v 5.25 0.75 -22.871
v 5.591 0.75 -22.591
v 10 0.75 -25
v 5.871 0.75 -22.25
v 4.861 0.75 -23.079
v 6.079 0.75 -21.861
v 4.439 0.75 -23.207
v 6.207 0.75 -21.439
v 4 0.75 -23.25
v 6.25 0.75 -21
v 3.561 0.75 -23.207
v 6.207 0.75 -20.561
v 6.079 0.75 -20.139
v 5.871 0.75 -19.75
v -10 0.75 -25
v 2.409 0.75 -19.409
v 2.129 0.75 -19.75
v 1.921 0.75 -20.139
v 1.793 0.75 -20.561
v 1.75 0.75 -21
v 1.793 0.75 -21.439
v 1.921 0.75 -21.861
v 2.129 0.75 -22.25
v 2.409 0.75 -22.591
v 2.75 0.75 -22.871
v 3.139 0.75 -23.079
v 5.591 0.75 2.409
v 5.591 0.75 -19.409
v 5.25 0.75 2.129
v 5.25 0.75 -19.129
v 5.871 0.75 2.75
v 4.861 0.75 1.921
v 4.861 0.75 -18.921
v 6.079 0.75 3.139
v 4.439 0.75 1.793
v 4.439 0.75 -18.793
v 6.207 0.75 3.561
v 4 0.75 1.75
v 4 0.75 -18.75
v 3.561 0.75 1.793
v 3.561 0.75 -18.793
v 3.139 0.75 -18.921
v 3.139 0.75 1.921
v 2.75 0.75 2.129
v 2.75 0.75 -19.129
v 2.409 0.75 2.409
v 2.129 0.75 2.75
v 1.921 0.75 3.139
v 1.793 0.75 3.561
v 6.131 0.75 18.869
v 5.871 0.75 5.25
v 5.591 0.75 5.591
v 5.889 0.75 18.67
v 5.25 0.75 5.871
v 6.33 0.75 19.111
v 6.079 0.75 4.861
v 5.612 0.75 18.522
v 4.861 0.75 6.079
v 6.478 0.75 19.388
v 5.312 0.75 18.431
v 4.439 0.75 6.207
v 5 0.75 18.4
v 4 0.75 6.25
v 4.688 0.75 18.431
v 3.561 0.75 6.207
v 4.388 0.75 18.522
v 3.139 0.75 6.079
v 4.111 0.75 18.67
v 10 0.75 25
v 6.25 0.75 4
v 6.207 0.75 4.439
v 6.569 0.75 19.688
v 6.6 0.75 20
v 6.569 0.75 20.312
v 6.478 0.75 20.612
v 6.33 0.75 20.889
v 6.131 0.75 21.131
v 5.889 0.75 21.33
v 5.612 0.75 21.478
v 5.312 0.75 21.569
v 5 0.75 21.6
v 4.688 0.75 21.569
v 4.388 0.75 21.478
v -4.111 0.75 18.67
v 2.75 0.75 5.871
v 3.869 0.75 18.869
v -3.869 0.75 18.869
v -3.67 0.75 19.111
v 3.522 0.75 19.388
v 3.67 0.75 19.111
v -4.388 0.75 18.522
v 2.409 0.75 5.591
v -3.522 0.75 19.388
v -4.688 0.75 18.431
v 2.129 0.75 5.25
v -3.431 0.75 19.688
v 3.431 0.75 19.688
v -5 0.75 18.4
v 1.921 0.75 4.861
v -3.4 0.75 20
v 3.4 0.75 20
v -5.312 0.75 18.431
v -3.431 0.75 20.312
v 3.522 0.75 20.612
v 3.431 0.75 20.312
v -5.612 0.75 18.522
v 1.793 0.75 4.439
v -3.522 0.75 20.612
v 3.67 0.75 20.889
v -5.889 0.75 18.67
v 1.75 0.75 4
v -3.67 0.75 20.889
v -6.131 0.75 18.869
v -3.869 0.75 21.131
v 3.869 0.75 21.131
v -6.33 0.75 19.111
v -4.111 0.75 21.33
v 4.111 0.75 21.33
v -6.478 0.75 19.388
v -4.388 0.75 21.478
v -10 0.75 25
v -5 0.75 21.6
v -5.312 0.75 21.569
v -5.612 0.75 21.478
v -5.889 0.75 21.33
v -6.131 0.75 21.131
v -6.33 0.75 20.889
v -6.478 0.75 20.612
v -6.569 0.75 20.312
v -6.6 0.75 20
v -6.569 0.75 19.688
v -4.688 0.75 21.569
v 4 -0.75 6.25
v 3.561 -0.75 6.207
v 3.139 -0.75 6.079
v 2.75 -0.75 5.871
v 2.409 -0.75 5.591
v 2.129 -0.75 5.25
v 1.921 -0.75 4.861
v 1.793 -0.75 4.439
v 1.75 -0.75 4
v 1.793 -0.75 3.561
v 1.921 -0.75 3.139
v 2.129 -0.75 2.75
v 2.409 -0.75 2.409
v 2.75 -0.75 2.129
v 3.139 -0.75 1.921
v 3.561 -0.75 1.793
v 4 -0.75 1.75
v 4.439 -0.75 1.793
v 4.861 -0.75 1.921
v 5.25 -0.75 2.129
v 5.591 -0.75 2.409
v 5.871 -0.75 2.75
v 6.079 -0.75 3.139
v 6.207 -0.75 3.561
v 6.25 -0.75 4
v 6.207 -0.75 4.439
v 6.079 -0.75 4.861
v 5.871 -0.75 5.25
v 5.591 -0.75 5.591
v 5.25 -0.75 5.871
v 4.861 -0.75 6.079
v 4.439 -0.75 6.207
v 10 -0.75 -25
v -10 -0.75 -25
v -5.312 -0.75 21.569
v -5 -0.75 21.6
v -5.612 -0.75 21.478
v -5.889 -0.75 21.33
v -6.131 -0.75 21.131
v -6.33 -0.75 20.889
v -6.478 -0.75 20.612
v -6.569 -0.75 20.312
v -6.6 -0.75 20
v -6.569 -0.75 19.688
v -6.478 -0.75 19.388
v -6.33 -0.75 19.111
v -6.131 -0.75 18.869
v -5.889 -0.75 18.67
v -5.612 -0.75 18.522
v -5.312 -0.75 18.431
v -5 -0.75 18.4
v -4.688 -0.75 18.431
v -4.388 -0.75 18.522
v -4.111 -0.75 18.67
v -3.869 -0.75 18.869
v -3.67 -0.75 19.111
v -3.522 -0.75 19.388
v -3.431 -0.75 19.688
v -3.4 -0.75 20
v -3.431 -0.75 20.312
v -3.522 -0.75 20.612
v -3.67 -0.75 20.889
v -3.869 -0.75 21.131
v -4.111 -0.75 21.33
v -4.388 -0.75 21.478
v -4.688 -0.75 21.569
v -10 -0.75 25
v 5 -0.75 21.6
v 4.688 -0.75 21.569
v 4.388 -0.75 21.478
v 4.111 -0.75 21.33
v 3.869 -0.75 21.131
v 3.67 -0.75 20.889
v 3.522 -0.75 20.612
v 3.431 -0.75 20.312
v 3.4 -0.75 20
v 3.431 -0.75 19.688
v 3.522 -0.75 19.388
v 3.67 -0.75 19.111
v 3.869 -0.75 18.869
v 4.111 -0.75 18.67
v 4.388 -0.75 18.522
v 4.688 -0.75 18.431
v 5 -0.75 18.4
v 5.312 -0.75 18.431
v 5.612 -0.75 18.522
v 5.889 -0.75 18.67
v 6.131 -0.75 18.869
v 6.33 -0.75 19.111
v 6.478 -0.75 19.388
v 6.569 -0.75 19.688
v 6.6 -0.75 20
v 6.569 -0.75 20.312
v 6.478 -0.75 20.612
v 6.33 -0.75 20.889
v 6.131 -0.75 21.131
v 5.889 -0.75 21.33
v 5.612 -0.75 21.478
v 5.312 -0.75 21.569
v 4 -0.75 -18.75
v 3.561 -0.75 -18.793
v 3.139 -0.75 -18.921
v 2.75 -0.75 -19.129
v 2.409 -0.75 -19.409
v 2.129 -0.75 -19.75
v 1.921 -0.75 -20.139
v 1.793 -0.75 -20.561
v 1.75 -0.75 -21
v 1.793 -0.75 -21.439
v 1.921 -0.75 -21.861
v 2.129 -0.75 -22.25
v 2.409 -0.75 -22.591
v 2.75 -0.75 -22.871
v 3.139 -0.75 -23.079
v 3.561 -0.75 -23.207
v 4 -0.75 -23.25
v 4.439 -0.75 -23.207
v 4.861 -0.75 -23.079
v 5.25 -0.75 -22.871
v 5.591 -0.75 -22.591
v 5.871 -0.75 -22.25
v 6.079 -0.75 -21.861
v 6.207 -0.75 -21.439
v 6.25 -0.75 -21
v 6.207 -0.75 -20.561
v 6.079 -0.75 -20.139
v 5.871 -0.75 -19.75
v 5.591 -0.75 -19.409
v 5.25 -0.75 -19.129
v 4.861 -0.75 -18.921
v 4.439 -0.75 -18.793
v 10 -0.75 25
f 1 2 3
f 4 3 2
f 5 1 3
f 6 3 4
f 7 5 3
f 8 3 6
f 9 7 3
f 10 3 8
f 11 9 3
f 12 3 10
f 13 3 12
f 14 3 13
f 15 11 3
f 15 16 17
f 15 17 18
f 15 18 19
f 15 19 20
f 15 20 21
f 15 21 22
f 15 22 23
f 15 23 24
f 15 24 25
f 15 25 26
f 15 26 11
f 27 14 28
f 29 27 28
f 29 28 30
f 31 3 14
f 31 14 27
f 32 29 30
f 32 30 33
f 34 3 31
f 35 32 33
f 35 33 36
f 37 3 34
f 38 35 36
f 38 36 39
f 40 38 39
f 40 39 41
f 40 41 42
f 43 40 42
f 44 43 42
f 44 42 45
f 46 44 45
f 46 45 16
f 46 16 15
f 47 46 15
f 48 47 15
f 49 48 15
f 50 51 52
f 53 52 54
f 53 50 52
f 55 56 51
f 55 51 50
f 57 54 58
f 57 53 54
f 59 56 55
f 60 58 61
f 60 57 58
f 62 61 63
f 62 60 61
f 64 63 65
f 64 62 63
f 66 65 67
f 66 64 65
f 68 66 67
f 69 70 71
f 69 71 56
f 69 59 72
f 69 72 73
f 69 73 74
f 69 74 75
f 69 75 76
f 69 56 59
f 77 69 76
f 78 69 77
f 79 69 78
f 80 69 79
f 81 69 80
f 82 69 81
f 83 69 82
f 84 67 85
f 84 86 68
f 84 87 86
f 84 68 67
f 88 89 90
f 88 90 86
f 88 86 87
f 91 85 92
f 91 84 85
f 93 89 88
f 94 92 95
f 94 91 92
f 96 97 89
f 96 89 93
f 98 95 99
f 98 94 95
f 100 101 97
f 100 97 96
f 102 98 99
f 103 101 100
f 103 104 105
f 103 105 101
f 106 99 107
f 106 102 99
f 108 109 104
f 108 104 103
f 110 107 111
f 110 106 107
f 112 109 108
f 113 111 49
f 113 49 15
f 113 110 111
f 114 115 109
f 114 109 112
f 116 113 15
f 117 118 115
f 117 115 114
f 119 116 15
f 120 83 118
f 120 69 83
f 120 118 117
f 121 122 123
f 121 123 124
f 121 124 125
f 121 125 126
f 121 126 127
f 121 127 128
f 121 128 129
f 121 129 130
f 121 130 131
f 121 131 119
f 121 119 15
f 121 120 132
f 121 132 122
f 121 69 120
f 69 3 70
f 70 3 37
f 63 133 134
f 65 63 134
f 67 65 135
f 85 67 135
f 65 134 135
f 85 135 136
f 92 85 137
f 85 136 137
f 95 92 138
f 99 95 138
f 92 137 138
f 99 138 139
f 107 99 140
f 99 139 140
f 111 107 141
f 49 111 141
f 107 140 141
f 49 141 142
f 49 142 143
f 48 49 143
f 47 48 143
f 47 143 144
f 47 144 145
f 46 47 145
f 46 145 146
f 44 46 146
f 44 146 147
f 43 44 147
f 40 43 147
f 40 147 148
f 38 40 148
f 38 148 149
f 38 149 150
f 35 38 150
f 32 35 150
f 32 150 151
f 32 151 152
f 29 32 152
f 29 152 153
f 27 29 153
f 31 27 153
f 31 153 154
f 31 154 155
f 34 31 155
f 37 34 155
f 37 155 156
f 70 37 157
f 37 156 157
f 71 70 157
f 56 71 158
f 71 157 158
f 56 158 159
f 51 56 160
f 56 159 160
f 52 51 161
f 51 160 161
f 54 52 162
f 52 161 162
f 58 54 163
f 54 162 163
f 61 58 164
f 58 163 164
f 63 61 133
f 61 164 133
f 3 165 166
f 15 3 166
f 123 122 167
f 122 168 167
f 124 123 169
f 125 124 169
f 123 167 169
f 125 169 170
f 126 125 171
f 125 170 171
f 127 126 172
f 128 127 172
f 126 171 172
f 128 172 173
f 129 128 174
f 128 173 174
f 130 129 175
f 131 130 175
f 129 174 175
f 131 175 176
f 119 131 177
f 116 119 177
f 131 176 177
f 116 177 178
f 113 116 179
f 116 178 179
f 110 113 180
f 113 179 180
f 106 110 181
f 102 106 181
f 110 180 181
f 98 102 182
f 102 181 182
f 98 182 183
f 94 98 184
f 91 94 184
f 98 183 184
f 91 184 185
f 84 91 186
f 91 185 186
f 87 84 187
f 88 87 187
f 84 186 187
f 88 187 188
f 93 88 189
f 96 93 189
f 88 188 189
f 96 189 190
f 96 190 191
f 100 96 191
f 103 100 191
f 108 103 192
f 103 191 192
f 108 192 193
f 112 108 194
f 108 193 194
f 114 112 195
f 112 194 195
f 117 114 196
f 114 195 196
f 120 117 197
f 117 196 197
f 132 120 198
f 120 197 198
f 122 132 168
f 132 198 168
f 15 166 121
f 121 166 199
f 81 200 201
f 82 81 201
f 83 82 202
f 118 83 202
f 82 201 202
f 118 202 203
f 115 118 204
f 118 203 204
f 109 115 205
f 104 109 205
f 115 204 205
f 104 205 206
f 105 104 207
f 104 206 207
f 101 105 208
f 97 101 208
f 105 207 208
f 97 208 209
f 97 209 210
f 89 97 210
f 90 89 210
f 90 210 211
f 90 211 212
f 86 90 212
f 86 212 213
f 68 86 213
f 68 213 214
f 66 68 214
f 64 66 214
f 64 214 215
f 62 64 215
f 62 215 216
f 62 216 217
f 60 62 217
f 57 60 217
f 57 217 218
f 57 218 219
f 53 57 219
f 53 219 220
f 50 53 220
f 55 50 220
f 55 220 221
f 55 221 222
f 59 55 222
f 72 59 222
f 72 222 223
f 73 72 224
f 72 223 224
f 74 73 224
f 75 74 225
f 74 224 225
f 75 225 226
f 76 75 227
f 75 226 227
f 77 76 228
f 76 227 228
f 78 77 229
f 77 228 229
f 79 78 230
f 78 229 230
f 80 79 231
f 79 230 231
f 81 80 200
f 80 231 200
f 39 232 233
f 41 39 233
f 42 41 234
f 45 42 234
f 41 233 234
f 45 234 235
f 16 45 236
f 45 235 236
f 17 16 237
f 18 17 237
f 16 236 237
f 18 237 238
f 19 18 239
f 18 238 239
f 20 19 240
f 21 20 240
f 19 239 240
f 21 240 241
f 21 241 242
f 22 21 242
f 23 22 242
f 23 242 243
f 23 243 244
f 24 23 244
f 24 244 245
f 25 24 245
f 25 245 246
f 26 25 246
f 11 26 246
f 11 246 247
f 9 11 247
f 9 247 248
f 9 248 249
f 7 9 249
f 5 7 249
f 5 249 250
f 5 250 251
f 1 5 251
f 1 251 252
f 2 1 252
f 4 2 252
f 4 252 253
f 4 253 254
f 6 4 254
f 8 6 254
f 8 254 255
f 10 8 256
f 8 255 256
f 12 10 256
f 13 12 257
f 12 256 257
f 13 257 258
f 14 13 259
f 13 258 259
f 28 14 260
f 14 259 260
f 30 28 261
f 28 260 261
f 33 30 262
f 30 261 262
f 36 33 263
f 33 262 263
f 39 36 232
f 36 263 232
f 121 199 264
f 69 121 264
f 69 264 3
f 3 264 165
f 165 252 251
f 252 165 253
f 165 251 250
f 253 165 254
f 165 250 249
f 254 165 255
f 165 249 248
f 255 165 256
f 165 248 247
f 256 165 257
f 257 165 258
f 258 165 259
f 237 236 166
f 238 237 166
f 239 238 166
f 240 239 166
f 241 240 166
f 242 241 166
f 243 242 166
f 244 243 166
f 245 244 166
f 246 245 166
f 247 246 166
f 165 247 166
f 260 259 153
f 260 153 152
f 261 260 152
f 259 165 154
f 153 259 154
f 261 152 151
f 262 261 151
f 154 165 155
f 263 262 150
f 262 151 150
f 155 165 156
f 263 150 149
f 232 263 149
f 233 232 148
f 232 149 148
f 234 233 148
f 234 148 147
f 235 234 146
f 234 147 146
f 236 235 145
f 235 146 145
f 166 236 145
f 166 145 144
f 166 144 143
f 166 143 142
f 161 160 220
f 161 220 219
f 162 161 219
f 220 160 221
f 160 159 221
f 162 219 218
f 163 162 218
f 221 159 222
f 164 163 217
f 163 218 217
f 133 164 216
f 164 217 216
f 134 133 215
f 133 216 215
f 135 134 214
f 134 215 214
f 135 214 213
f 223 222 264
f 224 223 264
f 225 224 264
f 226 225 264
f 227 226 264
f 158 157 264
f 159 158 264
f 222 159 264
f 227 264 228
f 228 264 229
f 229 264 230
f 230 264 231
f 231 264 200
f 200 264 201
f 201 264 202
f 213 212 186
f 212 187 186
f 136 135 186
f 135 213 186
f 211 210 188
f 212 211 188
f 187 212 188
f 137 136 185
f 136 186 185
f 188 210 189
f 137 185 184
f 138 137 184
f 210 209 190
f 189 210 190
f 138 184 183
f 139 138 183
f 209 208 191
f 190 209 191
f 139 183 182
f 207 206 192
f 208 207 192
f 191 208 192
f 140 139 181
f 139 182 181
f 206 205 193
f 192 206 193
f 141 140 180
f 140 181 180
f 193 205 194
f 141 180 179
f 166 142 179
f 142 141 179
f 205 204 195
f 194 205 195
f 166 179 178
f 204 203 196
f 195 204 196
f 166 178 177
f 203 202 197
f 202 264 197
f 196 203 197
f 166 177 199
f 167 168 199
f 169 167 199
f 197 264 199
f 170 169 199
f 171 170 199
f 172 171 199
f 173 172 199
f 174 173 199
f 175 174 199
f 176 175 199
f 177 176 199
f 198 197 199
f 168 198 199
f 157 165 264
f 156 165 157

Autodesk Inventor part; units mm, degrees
ref_plane "YZ Plane" through (0, 0, 0) normal (1, 0, 0) x (0, 1, 0)
ref_plane "XZ Plane" through (0, 0, 0) normal (0, 1, 0) x (-1, 0, 0)
ref_plane "XY Plane" through (0, 0, 0) normal (0, 0, 1) x (1, 0, 0)
sketch "Náčrt1" plane through (0, 0, 0) normal (0, 1, 0) x (-1, 0, 0)
  line L0 (10, 25) -> (-10, 25)
  line L1 (-10, 25) -> (-10, -25)
  line L2 (-10, -25) -> (10, -25)
  line L3 (10, -25) -> (10, 25)
  line L4 (0, -35) -> (0, 35) projected
  line L5 (-14, 0) -> (14, 0) projected
  point P0 (0, 0)
  dimension "d0" = 50
  dimension "d1" = 20
extrude "Vysunutí1" add sketch "Náčrt1" along normal mid plane 1.5
sketch "Náčrt2" plane through (0, 0.75, 0) normal (0, 1, 0) x (1, 0, 0)
  line L0 (-10, -25) -> (10, -25) projected
  line L1 (10, -25) -> (10, 25) projected
  line L2 (10, 25) -> (-10, 25) projected
  point P0 (0, 0)
  point P1 (5, -20)
  point P2 (-5, -20)
  dimension "d4" = 5
  dimension "d5" = 5
  dimension "d6" = 10
  dimension "d7" = 5
hole "Díra1" at (5, 0.75, 20) at (-5, 0.75, 20) direction (0, -1, 0) diameter 3.2 end through all
sketch "Náčrt3" plane through (0, 0.75, 0) normal (0, 1, 0) x (1, 0, 0)
  circle A0 centre (-5, -20) radius 1.6 projected
  circle A1 centre (5, -20) radius 1.6 projected
  line L0 (10, -25) -> (10, 25) projected
  line L1 (10, 25) -> (-10, 25) projected
  line L2 (-10, 25) -> (-10, -25) projected
  line L3 (-10, -25) -> (10, -25) projected
  point P0 (0, 0)
  point P1 (4, -4)
  point P2 (4, 21)
  dimension "d19" = 4
  dimension "d20" = 6
  dimension "d21" = 6
  dimension "d22" = 25
hole "Díra2" at (4, 0.75, 4) at (4, 0.75, -21) direction (0, -1, 0) diameter 4.5 end through all
properties part number "y_anchor_holder" material "Hliník 6061"
